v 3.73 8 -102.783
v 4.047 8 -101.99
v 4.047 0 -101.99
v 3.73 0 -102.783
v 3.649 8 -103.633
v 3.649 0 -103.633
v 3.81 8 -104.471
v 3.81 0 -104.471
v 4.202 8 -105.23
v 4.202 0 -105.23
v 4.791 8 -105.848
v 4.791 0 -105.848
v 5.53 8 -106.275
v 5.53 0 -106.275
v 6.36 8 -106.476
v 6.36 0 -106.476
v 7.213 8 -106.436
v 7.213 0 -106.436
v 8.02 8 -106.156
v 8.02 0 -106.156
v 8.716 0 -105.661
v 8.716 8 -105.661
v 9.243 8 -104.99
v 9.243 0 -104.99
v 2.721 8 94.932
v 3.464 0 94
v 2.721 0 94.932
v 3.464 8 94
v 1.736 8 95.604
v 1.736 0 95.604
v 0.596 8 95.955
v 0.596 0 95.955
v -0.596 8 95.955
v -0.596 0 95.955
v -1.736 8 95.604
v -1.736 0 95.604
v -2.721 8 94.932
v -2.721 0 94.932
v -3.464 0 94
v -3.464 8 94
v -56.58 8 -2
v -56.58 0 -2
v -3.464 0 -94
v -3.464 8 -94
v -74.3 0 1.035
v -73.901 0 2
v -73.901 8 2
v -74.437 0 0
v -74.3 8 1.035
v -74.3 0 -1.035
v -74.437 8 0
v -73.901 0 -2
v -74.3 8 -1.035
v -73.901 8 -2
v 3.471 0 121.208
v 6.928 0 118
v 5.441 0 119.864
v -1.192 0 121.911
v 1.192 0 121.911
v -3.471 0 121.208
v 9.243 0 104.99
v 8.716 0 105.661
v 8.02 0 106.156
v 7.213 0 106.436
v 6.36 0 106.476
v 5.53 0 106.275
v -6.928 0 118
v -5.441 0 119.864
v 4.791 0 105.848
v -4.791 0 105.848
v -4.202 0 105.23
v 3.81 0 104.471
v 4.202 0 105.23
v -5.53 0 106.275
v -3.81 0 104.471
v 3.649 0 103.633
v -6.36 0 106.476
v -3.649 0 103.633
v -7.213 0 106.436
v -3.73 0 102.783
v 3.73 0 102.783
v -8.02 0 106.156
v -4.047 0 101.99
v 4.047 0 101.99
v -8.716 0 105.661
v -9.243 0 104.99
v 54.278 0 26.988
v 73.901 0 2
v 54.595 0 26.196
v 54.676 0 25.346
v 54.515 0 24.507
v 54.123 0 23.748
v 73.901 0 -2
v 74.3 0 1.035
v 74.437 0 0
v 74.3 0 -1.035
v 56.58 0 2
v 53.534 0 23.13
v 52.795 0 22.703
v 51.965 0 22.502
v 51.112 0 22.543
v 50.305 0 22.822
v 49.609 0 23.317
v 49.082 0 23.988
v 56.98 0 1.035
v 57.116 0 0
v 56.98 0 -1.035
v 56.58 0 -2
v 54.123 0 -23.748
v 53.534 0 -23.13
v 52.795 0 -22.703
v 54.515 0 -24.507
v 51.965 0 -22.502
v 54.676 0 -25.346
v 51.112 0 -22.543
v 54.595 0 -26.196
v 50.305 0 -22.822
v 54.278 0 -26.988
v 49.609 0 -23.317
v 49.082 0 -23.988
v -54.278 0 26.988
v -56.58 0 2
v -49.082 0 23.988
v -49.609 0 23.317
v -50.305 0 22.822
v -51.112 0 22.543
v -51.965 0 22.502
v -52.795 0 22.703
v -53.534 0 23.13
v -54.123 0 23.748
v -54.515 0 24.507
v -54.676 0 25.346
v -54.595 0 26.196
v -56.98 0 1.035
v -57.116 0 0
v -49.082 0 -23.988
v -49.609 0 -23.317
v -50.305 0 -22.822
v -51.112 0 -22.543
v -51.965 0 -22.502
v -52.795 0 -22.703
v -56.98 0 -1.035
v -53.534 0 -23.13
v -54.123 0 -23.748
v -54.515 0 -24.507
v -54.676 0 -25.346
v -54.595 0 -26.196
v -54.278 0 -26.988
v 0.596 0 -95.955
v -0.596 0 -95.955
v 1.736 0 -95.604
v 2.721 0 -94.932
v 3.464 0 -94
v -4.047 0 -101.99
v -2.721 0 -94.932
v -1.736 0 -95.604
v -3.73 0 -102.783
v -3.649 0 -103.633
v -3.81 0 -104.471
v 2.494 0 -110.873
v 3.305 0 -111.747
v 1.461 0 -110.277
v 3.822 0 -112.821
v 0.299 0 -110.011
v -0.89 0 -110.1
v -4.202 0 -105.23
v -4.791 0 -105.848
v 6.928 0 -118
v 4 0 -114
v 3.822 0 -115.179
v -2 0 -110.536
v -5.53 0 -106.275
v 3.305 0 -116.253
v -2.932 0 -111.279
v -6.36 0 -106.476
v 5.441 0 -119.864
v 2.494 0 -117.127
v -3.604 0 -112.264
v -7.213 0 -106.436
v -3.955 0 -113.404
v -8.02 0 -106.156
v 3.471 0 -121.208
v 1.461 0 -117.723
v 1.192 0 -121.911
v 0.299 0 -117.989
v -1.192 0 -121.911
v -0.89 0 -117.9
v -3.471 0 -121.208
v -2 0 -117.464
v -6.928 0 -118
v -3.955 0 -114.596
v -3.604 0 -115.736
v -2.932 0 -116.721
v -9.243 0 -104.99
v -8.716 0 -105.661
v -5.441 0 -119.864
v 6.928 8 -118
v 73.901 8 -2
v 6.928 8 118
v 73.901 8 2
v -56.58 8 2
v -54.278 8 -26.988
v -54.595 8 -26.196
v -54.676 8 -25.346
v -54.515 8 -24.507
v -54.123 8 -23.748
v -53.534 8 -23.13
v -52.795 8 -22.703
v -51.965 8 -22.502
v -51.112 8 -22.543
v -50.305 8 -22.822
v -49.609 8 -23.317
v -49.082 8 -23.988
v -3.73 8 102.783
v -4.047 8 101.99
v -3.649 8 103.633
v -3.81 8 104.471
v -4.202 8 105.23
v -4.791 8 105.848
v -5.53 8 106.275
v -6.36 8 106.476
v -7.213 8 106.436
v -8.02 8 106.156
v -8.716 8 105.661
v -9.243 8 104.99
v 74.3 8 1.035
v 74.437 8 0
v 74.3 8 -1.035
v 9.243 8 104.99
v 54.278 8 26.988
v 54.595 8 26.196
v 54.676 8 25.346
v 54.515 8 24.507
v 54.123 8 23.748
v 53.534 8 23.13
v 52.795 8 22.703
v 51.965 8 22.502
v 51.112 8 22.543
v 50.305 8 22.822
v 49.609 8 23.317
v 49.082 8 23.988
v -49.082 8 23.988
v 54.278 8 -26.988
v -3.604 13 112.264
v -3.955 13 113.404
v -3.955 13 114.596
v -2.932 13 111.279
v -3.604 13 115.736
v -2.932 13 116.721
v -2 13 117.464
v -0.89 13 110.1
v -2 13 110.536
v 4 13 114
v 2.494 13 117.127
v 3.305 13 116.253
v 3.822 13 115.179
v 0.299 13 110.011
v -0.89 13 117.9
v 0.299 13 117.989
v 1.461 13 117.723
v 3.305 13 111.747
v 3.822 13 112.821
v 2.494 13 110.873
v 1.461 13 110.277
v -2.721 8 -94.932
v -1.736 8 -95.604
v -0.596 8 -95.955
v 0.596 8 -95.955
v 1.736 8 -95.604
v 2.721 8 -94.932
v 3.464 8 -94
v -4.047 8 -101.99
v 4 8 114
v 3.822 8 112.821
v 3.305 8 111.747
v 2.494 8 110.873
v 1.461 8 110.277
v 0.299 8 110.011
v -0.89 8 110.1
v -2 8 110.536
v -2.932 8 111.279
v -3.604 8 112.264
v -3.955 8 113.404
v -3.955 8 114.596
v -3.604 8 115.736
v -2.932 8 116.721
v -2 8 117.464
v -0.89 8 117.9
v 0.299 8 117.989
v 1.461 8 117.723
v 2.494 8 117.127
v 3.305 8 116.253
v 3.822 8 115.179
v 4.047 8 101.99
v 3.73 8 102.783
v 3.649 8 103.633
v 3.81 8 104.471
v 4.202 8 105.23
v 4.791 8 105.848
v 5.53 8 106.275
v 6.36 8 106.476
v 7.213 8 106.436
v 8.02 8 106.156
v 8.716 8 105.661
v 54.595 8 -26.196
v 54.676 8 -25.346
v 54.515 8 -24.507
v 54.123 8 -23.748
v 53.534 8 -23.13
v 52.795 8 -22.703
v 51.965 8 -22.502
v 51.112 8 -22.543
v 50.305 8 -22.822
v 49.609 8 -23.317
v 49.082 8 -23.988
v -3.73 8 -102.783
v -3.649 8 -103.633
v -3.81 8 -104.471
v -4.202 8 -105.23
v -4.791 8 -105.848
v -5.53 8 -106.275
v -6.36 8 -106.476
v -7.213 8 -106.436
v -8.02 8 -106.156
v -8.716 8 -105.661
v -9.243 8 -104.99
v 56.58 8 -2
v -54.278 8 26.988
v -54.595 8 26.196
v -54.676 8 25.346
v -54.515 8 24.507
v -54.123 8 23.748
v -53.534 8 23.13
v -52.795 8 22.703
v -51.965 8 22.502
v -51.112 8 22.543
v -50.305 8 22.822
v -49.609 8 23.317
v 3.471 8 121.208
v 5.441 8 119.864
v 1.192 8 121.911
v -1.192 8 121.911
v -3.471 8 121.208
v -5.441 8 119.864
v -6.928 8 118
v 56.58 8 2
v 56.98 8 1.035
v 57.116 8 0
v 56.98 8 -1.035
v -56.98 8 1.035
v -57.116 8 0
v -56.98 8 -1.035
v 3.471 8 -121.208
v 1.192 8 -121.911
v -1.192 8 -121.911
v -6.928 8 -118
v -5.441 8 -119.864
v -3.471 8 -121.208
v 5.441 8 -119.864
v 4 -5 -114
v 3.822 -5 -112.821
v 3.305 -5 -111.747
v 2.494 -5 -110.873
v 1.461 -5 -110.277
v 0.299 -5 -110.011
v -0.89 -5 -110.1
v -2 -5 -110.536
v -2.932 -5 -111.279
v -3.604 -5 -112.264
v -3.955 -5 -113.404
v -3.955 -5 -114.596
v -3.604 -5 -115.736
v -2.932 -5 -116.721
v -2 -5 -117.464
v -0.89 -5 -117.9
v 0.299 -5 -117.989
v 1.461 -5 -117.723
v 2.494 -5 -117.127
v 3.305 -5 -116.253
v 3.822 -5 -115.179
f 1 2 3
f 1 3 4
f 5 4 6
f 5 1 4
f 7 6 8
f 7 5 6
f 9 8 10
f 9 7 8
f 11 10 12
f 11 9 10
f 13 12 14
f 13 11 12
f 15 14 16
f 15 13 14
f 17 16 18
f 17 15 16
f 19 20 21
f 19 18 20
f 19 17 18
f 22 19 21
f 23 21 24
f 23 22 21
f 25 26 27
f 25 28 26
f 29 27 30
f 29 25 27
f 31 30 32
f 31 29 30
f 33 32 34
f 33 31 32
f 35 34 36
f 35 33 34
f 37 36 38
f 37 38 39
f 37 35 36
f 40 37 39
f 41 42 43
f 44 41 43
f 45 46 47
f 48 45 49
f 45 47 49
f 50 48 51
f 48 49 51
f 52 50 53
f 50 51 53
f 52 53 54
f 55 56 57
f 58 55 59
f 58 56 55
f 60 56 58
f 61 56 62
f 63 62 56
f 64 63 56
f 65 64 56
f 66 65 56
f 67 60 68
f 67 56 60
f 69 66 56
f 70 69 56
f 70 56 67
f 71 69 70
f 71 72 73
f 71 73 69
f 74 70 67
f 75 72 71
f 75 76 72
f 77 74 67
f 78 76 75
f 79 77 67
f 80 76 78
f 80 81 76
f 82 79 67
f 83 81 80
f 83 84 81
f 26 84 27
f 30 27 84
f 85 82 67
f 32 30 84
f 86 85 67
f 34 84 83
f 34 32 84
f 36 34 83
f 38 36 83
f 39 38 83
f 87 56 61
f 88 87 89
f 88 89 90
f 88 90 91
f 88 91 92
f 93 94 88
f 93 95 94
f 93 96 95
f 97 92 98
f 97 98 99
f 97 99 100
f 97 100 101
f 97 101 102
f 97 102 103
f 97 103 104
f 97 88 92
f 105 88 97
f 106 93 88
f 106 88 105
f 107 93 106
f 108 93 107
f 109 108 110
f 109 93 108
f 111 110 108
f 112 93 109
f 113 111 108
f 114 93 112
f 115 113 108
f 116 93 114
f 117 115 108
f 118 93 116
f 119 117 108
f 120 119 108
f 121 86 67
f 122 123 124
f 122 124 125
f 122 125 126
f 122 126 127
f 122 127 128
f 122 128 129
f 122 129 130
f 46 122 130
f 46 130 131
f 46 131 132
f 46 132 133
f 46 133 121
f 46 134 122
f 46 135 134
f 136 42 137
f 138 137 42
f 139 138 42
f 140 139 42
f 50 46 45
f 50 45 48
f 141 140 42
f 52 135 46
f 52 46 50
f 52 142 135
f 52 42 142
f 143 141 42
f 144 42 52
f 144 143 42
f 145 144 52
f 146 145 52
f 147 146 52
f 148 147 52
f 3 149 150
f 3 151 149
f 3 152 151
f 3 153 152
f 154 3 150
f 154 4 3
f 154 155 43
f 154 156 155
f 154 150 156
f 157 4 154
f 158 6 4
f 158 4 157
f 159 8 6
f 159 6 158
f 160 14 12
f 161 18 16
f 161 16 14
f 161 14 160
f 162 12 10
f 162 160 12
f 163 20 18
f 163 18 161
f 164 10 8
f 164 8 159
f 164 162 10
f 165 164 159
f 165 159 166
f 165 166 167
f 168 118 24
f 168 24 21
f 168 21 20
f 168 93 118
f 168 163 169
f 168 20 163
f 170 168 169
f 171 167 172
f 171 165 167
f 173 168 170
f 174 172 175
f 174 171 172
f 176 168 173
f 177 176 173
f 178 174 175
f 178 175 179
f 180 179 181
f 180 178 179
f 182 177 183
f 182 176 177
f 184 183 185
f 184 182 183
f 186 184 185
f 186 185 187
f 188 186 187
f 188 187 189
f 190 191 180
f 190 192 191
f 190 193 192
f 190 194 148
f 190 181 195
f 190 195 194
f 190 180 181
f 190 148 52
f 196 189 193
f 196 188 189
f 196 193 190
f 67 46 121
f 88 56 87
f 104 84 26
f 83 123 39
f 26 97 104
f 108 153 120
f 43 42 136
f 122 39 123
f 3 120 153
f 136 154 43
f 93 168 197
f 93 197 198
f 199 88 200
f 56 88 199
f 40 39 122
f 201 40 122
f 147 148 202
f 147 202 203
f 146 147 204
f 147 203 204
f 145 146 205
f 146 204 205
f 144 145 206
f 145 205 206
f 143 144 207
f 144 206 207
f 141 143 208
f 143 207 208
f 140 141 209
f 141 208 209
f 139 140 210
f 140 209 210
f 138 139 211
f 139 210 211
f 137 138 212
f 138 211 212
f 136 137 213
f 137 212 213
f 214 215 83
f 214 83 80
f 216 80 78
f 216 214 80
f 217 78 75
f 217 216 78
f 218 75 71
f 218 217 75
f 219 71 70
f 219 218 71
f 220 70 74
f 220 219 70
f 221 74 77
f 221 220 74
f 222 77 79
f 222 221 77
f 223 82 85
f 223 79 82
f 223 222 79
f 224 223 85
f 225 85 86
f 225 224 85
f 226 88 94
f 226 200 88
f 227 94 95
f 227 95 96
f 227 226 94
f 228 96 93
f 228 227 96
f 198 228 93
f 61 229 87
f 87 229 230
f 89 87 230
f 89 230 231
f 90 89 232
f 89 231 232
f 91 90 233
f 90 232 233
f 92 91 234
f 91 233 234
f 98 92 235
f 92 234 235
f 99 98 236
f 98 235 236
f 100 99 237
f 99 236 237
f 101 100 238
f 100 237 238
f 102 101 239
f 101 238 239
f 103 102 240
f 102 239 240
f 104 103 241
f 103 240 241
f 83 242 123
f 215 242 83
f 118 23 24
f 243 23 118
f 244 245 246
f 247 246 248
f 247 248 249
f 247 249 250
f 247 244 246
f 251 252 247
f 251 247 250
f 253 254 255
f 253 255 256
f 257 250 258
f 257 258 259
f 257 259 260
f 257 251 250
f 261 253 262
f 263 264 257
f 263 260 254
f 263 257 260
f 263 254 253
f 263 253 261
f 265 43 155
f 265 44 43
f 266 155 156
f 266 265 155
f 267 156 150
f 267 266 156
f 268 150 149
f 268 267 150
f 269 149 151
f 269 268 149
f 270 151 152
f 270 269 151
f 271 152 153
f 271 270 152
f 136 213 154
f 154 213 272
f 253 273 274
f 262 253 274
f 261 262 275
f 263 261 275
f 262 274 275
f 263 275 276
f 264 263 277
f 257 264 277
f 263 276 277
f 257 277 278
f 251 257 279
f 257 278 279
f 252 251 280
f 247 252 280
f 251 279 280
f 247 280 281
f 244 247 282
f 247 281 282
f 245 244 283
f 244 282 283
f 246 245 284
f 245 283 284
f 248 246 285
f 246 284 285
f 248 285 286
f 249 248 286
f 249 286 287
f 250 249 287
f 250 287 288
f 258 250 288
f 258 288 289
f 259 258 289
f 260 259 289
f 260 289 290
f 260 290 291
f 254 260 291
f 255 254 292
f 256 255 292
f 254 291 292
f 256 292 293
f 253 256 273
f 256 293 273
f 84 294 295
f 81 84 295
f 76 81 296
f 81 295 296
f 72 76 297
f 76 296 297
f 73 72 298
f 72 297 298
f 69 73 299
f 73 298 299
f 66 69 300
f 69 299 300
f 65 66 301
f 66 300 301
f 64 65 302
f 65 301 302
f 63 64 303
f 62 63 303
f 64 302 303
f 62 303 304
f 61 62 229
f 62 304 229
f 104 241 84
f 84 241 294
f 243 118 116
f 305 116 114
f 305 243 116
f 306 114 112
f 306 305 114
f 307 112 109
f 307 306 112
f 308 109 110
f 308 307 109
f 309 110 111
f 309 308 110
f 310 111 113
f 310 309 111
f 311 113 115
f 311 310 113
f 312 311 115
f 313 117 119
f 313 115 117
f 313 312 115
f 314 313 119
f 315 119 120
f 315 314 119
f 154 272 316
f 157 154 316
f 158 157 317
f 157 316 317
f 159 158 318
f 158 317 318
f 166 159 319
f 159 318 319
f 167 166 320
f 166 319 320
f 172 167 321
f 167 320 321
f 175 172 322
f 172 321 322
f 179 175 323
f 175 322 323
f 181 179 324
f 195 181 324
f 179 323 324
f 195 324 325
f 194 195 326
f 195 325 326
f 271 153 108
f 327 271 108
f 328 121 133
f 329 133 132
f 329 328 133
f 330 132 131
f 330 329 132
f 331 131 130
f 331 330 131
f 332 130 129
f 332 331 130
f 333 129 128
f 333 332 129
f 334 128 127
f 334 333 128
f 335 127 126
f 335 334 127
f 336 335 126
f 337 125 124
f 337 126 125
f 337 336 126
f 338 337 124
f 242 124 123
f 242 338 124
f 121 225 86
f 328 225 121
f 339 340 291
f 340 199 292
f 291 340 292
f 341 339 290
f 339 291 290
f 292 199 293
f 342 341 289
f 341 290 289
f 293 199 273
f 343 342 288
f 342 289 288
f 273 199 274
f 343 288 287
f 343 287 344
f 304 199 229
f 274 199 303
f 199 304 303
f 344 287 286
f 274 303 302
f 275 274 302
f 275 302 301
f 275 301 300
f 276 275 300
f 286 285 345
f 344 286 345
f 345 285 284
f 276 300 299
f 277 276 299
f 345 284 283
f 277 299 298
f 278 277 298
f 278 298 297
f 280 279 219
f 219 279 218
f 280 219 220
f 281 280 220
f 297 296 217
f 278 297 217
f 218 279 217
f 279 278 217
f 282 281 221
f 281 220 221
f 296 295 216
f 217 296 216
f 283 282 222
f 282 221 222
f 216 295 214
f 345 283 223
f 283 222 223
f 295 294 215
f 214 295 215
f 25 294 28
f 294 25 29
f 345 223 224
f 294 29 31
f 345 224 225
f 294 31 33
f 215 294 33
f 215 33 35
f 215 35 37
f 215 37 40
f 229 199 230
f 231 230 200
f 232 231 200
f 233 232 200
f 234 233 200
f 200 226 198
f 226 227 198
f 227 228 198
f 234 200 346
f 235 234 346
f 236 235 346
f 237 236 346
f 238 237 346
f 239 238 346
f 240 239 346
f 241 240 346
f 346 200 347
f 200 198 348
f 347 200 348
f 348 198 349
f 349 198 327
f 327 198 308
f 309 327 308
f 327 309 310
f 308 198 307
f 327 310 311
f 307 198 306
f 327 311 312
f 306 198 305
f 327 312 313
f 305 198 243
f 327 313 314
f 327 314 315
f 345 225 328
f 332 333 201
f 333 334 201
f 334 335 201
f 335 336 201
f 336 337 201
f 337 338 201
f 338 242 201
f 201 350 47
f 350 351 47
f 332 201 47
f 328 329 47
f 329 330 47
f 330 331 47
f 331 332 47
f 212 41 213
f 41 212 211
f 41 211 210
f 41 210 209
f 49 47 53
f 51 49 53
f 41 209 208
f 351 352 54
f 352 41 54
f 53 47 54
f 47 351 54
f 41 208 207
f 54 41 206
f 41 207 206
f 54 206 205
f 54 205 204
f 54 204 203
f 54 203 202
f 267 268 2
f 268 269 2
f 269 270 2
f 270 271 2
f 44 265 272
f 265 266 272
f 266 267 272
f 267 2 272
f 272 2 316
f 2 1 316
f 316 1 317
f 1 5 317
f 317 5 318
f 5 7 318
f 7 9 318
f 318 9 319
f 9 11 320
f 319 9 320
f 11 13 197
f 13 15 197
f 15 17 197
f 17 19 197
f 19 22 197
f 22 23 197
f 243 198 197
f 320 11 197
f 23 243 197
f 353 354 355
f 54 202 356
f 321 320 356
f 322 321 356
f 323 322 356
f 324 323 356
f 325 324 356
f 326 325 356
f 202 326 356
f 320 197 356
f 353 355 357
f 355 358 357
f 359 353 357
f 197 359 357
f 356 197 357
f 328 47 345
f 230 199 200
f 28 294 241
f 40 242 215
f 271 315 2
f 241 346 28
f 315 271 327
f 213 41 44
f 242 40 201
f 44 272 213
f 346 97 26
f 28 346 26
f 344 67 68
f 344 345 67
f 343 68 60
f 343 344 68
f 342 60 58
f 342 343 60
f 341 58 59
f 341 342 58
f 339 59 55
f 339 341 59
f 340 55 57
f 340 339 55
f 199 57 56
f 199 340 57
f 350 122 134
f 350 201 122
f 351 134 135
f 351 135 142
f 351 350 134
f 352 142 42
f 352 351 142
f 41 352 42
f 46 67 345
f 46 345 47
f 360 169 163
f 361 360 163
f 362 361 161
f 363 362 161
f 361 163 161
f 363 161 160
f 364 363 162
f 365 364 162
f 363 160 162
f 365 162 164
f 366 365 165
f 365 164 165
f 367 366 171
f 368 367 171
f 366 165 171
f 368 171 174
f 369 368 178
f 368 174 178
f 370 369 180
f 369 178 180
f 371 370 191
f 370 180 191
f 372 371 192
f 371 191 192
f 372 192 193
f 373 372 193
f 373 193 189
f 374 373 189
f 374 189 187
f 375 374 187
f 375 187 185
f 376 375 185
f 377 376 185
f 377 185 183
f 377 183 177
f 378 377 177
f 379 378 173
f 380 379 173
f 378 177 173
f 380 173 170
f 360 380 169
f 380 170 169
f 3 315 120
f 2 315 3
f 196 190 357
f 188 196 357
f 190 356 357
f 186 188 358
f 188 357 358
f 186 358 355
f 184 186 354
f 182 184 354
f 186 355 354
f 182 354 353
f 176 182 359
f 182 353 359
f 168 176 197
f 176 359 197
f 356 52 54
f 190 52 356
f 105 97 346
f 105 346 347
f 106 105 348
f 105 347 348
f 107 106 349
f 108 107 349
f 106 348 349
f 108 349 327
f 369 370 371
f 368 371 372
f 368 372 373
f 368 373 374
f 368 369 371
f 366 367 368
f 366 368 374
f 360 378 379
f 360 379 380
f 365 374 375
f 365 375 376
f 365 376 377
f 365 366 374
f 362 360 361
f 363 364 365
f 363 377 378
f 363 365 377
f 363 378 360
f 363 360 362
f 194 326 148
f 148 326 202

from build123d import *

# Parameters (mm, degrees)
EXTRUDE_1_DEPTH     = 8
FILLET_1_R          = 8
FILLET_2_R          = 4
FILLET_3_R          = 4
CUT_EXTRUDE_1_DEPTH = 9
SKETCH_3_R          = 4
EXTRUDE_2_DEPTH     = 5
SKETCH_4_R          = 4
EXTRUDE_3_DEPTH     = 5


with BuildPart() as part:
    # 草图1 → 凸台-拉伸1 (new body)
    with BuildSketch(Plane(origin=(0, 0, 0), x_dir=(1, 0, 0), z_dir=(0, 1, 0))):
        Polygon((0, -130), (-75.055534995, 0), (0, 130), (75.055534995, 0), align=None)
        Polygon((57.735026919, 0), (0, -100), (-57.735026919, 0), (0, 100), align=None, mode=Mode.SUBTRACT)
    extrude(amount=EXTRUDE_1_DEPTH)

    # 圆角1
    fillet_1_edges = [part.edges().sort_by_distance(p)[0] for p in [
        (0, 4, -130),
        (0, 4, 130),
    ]]
    fillet(fillet_1_edges, radius=FILLET_1_R)

    # 圆角2
    fillet_2_edges = [part.edges().sort_by_distance(p)[0] for p in [
        (0, 4, -100),
        (0, 4, 100),
    ]]
    fillet(fillet_2_edges, radius=FILLET_2_R)

    # 圆角3
    fillet_3_edges = [part.edges().sort_by_distance(p)[0] for p in [
        (57.735026919, 4, 0),
        (-57.735026919, 4, 0),
        (75.055534995, 4, 0),
        (-75.055534995, 4, 0),
    ]]
    fillet(fillet_3_edges, radius=FILLET_3_R)

    # 草图2 → 切除-拉伸1 (cut, through all)
    with BuildSketch(Plane(origin=(0, 8, 0), x_dir=(1, 0, 0), z_dir=(0, 1, 0))):
        with BuildLine():
            Line((-9.243452109, -104.989871311), (-54.277652929, -26.988347411))
            ThreePointArc((-54.277652929, -26.988347411), (-53.179576718, -22.8902712), (-49.081500506, -23.988347411))
            Line((-49.081500506, -23.988347411), (-4.047299686, -101.989871311))
            ThreePointArc((-4.047299686, -101.989871311), (-5.145375897, -106.087947522), (-9.243452109, -104.989871311))
        make_face()
        with BuildLine():
            Line((9.243452109, -104.989871311), (54.277652929, -26.988347411))
            ThreePointArc((54.277652929, -26.988347411), (53.179576718, -22.8902712), (49.081500506, -23.988347411))
            Line((49.081500506, -23.988347411), (4.047299686, -101.989871311))
            ThreePointArc((4.047299686, -101.989871311), (5.145375897, -106.087947522), (9.243452109, -104.989871311))
        make_face()
        with BuildLine():
            Line((9.243452109, 104.989871311), (54.277652929, 26.988347411))
            ThreePointArc((54.277652929, 26.988347411), (53.179576718, 22.8902712), (49.081500506, 23.988347411))
            Line((49.081500506, 23.988347411), (4.047299686, 101.989871311))
            ThreePointArc((4.047299686, 101.989871311), (5.145375897, 106.087947522), (9.243452109, 104.989871311))
        make_face()
        with BuildLine():
            Line((-9.243452109, 104.989871311), (-54.277652929, 26.988347411))
            ThreePointArc((-54.277652929, 26.988347411), (-53.179576718, 22.8902712), (-49.081500506, 23.988347411))
            Line((-49.081500506, 23.988347411), (-4.047299686, 101.989871311))
            ThreePointArc((-4.047299686, 101.989871311), (-5.145375897, 106.087947522), (-9.243452109, 104.989871311))
        make_face()
    extrude(amount=-CUT_EXTRUDE_1_DEPTH, mode=Mode.SUBTRACT)

    # 草图3 → 凸台-拉伸2 (add)
    with BuildSketch(Plane(origin=(0, 8, 0), x_dir=(1, 0, 0), z_dir=(0, 1, 0))):
        with Locations((0, -114)):
            Circle(SKETCH_3_R)
    extrude(amount=EXTRUDE_2_DEPTH)

    # 草图4 → 凸台-拉伸3 (add)
    with BuildSketch(Plane.XZ):
        with Locations((0, -114)):
            Circle(SKETCH_4_R)
    extrude(amount=EXTRUDE_3_DEPTH)


solid = part.part
